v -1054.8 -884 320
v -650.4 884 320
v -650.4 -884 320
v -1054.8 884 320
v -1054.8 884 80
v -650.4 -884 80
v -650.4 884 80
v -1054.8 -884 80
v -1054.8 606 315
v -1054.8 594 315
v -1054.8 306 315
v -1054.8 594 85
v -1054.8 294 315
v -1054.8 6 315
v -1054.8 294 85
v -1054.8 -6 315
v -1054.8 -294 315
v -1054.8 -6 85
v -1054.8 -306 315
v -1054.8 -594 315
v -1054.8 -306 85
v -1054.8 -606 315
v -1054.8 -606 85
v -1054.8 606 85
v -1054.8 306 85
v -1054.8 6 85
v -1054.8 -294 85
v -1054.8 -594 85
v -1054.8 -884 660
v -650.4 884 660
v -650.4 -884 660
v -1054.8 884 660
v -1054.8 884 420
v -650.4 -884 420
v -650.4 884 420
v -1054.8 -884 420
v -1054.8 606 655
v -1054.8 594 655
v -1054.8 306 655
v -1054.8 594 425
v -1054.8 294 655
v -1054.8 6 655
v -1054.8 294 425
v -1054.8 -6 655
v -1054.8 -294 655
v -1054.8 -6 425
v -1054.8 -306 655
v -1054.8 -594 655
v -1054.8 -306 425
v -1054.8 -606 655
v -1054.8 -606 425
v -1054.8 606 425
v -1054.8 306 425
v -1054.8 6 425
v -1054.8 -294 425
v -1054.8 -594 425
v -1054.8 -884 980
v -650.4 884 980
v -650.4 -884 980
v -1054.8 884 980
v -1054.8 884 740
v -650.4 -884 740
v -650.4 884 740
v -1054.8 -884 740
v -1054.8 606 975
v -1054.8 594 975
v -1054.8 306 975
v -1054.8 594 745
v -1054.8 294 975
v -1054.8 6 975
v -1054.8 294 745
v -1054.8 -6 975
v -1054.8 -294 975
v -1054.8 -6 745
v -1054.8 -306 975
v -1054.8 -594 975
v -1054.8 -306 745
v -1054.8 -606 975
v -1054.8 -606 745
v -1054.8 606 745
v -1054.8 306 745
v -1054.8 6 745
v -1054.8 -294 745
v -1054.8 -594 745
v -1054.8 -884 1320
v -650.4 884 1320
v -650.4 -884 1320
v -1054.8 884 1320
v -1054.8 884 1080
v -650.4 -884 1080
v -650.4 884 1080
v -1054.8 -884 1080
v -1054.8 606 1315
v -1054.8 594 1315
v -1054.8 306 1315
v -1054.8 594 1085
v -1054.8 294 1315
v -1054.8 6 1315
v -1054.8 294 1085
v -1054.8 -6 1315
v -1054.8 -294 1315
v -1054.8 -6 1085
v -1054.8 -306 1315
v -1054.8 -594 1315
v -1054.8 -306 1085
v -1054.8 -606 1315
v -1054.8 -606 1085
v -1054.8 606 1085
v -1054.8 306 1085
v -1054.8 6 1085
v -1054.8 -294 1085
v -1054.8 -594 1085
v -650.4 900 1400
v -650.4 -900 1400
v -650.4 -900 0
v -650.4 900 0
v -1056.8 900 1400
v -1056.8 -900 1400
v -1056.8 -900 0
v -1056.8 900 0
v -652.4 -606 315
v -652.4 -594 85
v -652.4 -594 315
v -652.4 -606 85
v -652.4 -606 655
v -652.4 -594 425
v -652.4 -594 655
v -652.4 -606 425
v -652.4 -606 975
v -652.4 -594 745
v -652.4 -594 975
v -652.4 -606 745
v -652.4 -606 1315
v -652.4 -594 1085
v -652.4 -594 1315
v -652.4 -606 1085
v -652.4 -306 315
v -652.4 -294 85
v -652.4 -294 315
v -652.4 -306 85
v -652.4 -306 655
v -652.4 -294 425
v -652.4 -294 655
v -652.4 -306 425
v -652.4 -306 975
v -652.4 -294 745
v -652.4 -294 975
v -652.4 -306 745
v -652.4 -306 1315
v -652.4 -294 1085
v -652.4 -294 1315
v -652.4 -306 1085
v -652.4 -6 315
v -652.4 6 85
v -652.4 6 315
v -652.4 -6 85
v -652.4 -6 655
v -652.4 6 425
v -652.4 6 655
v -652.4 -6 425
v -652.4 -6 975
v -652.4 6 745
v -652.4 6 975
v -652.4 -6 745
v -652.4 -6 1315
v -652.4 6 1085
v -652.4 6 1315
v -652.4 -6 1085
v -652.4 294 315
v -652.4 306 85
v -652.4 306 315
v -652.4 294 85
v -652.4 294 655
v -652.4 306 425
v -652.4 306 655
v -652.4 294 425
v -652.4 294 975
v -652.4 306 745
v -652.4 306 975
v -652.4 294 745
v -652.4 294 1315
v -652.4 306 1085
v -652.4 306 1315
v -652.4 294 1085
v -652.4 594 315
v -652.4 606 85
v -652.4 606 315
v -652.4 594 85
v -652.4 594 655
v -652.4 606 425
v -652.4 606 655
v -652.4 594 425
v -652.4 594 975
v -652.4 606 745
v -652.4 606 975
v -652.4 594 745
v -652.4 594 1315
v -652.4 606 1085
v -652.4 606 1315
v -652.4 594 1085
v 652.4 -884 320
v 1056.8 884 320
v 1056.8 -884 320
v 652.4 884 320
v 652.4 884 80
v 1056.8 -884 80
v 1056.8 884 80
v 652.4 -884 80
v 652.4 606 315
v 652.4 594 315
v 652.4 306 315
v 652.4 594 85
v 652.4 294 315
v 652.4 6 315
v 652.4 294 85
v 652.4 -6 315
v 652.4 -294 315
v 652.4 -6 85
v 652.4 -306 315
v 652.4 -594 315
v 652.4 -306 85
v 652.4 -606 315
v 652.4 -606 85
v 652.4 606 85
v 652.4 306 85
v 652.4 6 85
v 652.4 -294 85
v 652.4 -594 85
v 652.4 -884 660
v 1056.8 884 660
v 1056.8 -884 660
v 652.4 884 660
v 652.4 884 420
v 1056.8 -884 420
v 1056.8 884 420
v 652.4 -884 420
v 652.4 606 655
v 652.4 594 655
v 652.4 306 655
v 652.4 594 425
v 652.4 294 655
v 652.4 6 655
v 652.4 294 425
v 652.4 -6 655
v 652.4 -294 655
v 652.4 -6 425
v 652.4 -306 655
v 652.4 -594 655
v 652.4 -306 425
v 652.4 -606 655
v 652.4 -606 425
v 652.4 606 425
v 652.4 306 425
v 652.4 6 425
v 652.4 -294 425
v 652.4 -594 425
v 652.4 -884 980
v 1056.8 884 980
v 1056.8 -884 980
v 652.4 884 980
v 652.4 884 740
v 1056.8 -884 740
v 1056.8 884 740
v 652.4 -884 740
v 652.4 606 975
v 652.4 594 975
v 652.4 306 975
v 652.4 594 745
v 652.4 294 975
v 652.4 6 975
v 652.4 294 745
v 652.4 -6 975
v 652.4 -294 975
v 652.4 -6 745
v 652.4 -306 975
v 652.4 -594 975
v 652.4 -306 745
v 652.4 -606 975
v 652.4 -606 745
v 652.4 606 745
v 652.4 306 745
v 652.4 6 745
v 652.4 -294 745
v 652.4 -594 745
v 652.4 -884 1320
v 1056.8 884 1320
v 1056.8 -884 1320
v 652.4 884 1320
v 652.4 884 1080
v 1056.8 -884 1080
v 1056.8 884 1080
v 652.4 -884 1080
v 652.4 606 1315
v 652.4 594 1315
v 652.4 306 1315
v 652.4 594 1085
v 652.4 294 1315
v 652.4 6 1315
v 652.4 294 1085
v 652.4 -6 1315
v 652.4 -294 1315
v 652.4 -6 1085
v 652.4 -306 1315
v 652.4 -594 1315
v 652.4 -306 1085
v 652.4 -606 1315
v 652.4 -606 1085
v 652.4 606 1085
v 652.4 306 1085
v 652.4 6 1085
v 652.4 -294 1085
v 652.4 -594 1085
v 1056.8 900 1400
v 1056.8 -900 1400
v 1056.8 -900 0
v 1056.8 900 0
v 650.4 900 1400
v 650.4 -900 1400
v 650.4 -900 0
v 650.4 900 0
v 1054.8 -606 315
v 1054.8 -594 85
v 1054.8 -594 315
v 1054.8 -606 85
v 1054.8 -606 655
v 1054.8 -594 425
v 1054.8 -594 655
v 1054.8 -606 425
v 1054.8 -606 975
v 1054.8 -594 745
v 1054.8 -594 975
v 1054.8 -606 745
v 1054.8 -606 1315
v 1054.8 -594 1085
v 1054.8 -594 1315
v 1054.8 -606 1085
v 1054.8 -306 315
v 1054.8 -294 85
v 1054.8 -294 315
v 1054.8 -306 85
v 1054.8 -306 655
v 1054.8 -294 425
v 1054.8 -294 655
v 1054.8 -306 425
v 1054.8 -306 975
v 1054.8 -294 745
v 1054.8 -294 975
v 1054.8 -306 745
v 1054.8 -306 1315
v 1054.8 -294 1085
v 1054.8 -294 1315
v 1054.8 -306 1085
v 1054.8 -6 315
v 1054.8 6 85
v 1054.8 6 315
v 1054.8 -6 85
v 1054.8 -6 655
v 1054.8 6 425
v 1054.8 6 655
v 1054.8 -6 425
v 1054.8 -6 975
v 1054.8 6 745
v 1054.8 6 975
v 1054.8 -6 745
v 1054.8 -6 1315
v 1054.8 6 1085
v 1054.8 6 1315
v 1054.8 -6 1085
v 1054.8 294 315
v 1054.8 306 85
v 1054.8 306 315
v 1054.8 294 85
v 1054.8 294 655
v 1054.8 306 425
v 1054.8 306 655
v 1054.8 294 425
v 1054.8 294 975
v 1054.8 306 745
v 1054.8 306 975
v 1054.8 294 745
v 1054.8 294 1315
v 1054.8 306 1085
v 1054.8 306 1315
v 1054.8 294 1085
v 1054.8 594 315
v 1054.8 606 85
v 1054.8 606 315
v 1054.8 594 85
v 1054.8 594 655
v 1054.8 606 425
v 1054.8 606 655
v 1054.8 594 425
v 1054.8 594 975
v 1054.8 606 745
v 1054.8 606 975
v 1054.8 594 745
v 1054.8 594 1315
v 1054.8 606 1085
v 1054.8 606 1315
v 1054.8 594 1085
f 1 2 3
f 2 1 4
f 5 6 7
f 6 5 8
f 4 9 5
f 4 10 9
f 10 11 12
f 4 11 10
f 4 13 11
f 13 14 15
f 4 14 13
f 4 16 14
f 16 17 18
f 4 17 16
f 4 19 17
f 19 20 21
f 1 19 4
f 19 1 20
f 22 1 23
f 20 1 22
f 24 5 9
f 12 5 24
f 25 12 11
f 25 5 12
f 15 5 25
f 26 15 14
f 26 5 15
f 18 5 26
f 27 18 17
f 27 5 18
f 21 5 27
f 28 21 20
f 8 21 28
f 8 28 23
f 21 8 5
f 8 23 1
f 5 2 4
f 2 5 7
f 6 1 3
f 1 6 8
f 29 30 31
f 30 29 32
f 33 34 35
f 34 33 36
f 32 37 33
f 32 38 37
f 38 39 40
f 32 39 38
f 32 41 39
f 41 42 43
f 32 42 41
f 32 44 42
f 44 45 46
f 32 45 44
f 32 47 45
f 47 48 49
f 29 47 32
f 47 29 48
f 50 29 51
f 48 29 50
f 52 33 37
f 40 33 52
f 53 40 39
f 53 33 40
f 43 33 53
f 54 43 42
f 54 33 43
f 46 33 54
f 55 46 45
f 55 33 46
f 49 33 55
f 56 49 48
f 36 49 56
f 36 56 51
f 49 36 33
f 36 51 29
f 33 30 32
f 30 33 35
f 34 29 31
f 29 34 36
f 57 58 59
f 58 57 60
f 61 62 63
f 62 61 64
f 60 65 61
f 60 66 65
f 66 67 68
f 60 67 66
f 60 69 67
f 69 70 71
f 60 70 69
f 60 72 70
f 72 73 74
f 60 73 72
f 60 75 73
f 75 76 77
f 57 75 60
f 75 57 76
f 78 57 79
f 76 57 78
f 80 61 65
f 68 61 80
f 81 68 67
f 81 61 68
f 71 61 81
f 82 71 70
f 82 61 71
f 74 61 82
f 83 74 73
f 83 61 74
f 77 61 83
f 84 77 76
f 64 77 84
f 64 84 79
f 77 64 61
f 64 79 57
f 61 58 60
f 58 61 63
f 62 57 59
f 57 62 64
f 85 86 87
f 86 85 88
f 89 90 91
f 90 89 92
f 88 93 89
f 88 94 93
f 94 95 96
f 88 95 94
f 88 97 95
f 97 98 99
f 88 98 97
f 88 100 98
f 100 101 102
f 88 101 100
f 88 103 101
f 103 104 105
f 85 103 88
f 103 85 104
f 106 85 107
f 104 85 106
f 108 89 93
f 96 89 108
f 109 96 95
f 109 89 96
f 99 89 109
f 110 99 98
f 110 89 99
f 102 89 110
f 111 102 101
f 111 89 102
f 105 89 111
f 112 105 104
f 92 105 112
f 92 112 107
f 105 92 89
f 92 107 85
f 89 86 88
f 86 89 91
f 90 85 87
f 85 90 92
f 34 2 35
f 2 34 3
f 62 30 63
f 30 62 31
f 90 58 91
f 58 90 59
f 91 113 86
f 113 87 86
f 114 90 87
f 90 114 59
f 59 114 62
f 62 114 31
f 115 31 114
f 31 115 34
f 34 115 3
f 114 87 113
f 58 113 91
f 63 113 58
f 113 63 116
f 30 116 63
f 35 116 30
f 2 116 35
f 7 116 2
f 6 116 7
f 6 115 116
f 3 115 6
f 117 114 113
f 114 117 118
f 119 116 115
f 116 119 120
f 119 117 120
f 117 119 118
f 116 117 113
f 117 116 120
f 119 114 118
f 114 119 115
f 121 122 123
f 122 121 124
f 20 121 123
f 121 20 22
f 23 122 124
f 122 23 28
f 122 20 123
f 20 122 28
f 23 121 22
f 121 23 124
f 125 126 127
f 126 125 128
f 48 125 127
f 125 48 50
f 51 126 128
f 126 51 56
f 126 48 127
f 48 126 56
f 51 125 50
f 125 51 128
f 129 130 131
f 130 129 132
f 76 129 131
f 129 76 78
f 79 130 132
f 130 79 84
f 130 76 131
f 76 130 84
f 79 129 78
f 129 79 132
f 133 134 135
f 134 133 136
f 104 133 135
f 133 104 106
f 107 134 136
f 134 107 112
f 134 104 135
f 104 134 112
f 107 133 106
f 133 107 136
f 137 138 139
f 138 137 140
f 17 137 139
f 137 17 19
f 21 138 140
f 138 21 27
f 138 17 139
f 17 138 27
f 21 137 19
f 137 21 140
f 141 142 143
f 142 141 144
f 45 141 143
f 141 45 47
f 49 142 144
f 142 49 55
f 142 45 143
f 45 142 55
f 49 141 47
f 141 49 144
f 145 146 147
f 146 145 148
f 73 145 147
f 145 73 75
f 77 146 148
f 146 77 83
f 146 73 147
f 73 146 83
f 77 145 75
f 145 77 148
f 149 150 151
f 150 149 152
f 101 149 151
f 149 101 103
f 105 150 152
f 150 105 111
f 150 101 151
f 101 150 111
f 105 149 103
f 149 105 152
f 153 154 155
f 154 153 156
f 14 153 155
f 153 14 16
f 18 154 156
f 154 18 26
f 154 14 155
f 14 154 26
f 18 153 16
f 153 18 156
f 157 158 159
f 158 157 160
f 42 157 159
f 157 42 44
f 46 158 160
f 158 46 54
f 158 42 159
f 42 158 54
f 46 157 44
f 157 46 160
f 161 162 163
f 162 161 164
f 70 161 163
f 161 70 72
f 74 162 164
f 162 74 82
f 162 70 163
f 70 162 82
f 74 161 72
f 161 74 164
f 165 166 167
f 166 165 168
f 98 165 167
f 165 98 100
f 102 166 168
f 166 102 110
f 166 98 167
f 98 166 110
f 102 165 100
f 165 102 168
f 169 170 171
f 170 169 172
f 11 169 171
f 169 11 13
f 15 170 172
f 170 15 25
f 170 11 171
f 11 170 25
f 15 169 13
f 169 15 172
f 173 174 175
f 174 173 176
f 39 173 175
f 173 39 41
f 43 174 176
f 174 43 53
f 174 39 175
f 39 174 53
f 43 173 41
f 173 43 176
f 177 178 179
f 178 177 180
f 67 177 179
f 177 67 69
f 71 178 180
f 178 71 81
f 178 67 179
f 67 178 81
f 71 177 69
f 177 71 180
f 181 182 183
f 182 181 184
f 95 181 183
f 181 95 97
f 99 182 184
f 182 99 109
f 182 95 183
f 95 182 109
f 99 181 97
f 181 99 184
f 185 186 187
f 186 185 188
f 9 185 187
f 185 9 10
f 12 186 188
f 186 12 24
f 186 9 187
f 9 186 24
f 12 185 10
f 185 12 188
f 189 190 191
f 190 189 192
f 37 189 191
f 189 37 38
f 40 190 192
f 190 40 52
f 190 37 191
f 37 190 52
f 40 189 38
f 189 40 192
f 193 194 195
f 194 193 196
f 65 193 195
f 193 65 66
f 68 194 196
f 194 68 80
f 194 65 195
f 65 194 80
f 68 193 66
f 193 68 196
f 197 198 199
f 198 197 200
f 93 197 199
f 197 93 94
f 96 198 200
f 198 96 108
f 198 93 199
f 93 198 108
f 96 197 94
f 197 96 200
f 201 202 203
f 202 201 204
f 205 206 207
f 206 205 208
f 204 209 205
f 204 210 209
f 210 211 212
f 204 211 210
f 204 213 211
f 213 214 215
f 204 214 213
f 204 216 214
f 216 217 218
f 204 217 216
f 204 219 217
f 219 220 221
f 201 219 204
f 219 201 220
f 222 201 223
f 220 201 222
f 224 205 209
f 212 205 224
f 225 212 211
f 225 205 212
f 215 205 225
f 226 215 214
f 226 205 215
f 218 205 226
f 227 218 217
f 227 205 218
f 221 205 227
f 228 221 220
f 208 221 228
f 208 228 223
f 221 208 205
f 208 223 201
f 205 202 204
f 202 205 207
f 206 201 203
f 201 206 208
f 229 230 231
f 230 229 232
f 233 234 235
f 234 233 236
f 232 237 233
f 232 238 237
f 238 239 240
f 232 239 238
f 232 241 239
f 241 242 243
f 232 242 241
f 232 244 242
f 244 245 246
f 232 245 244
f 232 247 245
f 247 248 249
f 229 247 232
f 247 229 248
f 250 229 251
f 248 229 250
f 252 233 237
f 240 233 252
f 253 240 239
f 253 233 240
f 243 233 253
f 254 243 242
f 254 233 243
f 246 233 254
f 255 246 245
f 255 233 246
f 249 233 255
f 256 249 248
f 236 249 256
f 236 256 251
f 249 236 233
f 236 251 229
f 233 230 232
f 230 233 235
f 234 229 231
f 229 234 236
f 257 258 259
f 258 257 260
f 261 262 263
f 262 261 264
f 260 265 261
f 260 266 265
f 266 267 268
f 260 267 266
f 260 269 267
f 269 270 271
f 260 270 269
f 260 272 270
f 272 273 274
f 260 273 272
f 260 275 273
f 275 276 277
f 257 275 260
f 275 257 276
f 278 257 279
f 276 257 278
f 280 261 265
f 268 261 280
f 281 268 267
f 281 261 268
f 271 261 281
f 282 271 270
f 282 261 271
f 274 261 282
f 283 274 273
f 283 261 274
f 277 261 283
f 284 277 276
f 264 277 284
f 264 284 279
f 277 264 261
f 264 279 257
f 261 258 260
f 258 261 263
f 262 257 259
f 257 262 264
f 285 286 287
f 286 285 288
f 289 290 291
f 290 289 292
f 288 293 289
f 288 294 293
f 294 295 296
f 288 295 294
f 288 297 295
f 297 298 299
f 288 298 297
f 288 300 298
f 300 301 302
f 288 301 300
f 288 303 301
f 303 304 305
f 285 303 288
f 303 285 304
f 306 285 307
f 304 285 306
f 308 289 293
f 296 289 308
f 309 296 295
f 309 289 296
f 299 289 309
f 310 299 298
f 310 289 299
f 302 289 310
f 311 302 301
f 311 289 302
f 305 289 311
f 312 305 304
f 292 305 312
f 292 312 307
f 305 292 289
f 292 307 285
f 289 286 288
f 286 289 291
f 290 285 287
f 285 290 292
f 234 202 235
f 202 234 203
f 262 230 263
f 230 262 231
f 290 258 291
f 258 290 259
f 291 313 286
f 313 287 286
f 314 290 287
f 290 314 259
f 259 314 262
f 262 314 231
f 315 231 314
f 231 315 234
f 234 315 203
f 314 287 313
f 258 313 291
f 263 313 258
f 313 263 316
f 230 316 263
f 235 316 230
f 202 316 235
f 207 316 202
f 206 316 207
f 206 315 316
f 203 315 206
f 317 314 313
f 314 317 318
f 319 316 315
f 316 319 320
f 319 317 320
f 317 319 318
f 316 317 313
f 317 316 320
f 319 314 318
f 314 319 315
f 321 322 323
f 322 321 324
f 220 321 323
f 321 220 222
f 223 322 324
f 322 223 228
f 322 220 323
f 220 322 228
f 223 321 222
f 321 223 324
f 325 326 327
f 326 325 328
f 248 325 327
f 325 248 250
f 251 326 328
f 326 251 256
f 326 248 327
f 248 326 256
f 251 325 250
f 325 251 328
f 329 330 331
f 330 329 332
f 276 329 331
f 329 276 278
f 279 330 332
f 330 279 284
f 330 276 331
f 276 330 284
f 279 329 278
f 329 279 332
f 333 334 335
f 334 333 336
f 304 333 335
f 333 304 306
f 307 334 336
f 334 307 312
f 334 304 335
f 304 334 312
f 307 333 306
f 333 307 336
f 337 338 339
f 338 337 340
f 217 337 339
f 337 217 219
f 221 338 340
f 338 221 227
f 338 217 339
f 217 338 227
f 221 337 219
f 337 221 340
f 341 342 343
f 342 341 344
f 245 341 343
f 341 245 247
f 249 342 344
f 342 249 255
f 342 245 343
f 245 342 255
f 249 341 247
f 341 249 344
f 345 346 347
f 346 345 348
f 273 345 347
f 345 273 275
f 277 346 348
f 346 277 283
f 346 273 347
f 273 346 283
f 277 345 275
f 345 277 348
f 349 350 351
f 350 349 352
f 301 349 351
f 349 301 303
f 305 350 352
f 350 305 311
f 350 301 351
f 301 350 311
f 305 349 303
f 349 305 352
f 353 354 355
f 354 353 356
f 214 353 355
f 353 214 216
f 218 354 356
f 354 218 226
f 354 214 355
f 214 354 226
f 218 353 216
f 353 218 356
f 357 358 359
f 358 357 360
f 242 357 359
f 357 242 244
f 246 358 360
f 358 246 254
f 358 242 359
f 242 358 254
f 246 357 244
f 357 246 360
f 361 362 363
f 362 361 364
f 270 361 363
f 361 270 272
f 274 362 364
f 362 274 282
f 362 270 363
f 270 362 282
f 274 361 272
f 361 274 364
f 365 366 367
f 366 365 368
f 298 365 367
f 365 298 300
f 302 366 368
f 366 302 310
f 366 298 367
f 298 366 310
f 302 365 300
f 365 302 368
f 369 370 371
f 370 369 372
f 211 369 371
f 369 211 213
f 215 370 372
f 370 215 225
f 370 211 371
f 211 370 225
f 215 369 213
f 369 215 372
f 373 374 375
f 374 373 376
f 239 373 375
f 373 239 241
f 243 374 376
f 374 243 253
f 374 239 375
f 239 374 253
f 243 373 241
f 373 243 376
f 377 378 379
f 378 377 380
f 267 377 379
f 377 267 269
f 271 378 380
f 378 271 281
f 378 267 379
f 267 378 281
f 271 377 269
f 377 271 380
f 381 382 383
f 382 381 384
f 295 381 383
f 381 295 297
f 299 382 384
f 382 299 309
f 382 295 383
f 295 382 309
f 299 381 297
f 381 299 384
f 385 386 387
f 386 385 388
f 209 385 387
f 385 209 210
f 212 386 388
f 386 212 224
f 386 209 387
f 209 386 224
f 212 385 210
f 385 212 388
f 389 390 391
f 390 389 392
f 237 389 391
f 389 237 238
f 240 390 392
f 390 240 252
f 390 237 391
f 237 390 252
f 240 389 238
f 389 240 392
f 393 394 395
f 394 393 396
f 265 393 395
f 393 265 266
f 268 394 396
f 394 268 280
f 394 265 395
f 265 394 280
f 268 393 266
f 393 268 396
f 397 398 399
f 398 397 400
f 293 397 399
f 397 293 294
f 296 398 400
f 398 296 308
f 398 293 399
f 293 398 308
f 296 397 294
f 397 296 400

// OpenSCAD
// ====================================================================================
// REVOLUTIONARY TECHNOLOGY COMPANY & UNIVERSITY OF WASHINGTON DEPARTMENT OF PHYSICS
// Subsystem: van_md_shelving.scad (OtterBox Commercial Tool Racking Matrix)
// Core Application: Dual-Density Sealed Fleet Shelving Units & Bin Compartments
// Center Origin (0,0,0) = Mid-point of the Rear Cargo Floor Plane Axis
// ====================================================================================

$fn = 80; // High-precision panel molding and rack grid resolution

// --- OtterBox Shelving Dimensional Constants (mm) ---
inch_to_mm         = 25.4;
rack_depth         = 16.0 * inch_to_mm;  // 406.40 mm deep tools/parts shelves
rack_length        = 1800.00;          // Extended warehouse shelf storage run depth
rack_height        = 1400.00;          // Vertical height accessible from interior walkthrough lines
partition_spacing  = 300.00;           // Bin divider separation grid width

module otterbox_side_racking_units() {
    echo("COMPILING OTTERBOX DUAL-DENSITY MODULAR WORK VAN BIN AND SHELVING COMPARTMENTS");
    // Left and Right parallel wall storage stacks optimized for industrial cargo retention [INDEX]
    for (side = [-1, 1]) {
        translate([side * (84.00 * inch_to_mm / 2 - rack_depth/2 - 10), 0, rack_height/2]) {
            color("DimGrey") {
                difference() {
                    // Main solid shelving unit exterior frame housing
                    cube([rack_depth, rack_length, rack_height], center=true);
                    
                    // Hollow out shelves (4 horizontal storage tiers)
                    for (z_tier = [-500, -160, 160, 500]) {
                        translate([2, 0, z_tier])
                            cube([rack_depth, rack_length - 32, 240], center=true);
                    }
                }
            }
            
            // Deploy vertical parts dividers inside individual tiers
            color("DarkCharcoal") {
                for (y_div = [-rack_length/2 + partition_spacing : partition_spacing : rack_length/2 - partition_spacing]) {
                    for (z_tier = [-500, -160, 160, 500]) {
                        translate([0, y_div, z_tier])
                            cube([rack_depth - 4, 12.0, 230], center=true);
                    }
                }
            }
        }
    }
}

// --- Compile Industrial Storage Assembly ---
otterbox_side_racking_units();
